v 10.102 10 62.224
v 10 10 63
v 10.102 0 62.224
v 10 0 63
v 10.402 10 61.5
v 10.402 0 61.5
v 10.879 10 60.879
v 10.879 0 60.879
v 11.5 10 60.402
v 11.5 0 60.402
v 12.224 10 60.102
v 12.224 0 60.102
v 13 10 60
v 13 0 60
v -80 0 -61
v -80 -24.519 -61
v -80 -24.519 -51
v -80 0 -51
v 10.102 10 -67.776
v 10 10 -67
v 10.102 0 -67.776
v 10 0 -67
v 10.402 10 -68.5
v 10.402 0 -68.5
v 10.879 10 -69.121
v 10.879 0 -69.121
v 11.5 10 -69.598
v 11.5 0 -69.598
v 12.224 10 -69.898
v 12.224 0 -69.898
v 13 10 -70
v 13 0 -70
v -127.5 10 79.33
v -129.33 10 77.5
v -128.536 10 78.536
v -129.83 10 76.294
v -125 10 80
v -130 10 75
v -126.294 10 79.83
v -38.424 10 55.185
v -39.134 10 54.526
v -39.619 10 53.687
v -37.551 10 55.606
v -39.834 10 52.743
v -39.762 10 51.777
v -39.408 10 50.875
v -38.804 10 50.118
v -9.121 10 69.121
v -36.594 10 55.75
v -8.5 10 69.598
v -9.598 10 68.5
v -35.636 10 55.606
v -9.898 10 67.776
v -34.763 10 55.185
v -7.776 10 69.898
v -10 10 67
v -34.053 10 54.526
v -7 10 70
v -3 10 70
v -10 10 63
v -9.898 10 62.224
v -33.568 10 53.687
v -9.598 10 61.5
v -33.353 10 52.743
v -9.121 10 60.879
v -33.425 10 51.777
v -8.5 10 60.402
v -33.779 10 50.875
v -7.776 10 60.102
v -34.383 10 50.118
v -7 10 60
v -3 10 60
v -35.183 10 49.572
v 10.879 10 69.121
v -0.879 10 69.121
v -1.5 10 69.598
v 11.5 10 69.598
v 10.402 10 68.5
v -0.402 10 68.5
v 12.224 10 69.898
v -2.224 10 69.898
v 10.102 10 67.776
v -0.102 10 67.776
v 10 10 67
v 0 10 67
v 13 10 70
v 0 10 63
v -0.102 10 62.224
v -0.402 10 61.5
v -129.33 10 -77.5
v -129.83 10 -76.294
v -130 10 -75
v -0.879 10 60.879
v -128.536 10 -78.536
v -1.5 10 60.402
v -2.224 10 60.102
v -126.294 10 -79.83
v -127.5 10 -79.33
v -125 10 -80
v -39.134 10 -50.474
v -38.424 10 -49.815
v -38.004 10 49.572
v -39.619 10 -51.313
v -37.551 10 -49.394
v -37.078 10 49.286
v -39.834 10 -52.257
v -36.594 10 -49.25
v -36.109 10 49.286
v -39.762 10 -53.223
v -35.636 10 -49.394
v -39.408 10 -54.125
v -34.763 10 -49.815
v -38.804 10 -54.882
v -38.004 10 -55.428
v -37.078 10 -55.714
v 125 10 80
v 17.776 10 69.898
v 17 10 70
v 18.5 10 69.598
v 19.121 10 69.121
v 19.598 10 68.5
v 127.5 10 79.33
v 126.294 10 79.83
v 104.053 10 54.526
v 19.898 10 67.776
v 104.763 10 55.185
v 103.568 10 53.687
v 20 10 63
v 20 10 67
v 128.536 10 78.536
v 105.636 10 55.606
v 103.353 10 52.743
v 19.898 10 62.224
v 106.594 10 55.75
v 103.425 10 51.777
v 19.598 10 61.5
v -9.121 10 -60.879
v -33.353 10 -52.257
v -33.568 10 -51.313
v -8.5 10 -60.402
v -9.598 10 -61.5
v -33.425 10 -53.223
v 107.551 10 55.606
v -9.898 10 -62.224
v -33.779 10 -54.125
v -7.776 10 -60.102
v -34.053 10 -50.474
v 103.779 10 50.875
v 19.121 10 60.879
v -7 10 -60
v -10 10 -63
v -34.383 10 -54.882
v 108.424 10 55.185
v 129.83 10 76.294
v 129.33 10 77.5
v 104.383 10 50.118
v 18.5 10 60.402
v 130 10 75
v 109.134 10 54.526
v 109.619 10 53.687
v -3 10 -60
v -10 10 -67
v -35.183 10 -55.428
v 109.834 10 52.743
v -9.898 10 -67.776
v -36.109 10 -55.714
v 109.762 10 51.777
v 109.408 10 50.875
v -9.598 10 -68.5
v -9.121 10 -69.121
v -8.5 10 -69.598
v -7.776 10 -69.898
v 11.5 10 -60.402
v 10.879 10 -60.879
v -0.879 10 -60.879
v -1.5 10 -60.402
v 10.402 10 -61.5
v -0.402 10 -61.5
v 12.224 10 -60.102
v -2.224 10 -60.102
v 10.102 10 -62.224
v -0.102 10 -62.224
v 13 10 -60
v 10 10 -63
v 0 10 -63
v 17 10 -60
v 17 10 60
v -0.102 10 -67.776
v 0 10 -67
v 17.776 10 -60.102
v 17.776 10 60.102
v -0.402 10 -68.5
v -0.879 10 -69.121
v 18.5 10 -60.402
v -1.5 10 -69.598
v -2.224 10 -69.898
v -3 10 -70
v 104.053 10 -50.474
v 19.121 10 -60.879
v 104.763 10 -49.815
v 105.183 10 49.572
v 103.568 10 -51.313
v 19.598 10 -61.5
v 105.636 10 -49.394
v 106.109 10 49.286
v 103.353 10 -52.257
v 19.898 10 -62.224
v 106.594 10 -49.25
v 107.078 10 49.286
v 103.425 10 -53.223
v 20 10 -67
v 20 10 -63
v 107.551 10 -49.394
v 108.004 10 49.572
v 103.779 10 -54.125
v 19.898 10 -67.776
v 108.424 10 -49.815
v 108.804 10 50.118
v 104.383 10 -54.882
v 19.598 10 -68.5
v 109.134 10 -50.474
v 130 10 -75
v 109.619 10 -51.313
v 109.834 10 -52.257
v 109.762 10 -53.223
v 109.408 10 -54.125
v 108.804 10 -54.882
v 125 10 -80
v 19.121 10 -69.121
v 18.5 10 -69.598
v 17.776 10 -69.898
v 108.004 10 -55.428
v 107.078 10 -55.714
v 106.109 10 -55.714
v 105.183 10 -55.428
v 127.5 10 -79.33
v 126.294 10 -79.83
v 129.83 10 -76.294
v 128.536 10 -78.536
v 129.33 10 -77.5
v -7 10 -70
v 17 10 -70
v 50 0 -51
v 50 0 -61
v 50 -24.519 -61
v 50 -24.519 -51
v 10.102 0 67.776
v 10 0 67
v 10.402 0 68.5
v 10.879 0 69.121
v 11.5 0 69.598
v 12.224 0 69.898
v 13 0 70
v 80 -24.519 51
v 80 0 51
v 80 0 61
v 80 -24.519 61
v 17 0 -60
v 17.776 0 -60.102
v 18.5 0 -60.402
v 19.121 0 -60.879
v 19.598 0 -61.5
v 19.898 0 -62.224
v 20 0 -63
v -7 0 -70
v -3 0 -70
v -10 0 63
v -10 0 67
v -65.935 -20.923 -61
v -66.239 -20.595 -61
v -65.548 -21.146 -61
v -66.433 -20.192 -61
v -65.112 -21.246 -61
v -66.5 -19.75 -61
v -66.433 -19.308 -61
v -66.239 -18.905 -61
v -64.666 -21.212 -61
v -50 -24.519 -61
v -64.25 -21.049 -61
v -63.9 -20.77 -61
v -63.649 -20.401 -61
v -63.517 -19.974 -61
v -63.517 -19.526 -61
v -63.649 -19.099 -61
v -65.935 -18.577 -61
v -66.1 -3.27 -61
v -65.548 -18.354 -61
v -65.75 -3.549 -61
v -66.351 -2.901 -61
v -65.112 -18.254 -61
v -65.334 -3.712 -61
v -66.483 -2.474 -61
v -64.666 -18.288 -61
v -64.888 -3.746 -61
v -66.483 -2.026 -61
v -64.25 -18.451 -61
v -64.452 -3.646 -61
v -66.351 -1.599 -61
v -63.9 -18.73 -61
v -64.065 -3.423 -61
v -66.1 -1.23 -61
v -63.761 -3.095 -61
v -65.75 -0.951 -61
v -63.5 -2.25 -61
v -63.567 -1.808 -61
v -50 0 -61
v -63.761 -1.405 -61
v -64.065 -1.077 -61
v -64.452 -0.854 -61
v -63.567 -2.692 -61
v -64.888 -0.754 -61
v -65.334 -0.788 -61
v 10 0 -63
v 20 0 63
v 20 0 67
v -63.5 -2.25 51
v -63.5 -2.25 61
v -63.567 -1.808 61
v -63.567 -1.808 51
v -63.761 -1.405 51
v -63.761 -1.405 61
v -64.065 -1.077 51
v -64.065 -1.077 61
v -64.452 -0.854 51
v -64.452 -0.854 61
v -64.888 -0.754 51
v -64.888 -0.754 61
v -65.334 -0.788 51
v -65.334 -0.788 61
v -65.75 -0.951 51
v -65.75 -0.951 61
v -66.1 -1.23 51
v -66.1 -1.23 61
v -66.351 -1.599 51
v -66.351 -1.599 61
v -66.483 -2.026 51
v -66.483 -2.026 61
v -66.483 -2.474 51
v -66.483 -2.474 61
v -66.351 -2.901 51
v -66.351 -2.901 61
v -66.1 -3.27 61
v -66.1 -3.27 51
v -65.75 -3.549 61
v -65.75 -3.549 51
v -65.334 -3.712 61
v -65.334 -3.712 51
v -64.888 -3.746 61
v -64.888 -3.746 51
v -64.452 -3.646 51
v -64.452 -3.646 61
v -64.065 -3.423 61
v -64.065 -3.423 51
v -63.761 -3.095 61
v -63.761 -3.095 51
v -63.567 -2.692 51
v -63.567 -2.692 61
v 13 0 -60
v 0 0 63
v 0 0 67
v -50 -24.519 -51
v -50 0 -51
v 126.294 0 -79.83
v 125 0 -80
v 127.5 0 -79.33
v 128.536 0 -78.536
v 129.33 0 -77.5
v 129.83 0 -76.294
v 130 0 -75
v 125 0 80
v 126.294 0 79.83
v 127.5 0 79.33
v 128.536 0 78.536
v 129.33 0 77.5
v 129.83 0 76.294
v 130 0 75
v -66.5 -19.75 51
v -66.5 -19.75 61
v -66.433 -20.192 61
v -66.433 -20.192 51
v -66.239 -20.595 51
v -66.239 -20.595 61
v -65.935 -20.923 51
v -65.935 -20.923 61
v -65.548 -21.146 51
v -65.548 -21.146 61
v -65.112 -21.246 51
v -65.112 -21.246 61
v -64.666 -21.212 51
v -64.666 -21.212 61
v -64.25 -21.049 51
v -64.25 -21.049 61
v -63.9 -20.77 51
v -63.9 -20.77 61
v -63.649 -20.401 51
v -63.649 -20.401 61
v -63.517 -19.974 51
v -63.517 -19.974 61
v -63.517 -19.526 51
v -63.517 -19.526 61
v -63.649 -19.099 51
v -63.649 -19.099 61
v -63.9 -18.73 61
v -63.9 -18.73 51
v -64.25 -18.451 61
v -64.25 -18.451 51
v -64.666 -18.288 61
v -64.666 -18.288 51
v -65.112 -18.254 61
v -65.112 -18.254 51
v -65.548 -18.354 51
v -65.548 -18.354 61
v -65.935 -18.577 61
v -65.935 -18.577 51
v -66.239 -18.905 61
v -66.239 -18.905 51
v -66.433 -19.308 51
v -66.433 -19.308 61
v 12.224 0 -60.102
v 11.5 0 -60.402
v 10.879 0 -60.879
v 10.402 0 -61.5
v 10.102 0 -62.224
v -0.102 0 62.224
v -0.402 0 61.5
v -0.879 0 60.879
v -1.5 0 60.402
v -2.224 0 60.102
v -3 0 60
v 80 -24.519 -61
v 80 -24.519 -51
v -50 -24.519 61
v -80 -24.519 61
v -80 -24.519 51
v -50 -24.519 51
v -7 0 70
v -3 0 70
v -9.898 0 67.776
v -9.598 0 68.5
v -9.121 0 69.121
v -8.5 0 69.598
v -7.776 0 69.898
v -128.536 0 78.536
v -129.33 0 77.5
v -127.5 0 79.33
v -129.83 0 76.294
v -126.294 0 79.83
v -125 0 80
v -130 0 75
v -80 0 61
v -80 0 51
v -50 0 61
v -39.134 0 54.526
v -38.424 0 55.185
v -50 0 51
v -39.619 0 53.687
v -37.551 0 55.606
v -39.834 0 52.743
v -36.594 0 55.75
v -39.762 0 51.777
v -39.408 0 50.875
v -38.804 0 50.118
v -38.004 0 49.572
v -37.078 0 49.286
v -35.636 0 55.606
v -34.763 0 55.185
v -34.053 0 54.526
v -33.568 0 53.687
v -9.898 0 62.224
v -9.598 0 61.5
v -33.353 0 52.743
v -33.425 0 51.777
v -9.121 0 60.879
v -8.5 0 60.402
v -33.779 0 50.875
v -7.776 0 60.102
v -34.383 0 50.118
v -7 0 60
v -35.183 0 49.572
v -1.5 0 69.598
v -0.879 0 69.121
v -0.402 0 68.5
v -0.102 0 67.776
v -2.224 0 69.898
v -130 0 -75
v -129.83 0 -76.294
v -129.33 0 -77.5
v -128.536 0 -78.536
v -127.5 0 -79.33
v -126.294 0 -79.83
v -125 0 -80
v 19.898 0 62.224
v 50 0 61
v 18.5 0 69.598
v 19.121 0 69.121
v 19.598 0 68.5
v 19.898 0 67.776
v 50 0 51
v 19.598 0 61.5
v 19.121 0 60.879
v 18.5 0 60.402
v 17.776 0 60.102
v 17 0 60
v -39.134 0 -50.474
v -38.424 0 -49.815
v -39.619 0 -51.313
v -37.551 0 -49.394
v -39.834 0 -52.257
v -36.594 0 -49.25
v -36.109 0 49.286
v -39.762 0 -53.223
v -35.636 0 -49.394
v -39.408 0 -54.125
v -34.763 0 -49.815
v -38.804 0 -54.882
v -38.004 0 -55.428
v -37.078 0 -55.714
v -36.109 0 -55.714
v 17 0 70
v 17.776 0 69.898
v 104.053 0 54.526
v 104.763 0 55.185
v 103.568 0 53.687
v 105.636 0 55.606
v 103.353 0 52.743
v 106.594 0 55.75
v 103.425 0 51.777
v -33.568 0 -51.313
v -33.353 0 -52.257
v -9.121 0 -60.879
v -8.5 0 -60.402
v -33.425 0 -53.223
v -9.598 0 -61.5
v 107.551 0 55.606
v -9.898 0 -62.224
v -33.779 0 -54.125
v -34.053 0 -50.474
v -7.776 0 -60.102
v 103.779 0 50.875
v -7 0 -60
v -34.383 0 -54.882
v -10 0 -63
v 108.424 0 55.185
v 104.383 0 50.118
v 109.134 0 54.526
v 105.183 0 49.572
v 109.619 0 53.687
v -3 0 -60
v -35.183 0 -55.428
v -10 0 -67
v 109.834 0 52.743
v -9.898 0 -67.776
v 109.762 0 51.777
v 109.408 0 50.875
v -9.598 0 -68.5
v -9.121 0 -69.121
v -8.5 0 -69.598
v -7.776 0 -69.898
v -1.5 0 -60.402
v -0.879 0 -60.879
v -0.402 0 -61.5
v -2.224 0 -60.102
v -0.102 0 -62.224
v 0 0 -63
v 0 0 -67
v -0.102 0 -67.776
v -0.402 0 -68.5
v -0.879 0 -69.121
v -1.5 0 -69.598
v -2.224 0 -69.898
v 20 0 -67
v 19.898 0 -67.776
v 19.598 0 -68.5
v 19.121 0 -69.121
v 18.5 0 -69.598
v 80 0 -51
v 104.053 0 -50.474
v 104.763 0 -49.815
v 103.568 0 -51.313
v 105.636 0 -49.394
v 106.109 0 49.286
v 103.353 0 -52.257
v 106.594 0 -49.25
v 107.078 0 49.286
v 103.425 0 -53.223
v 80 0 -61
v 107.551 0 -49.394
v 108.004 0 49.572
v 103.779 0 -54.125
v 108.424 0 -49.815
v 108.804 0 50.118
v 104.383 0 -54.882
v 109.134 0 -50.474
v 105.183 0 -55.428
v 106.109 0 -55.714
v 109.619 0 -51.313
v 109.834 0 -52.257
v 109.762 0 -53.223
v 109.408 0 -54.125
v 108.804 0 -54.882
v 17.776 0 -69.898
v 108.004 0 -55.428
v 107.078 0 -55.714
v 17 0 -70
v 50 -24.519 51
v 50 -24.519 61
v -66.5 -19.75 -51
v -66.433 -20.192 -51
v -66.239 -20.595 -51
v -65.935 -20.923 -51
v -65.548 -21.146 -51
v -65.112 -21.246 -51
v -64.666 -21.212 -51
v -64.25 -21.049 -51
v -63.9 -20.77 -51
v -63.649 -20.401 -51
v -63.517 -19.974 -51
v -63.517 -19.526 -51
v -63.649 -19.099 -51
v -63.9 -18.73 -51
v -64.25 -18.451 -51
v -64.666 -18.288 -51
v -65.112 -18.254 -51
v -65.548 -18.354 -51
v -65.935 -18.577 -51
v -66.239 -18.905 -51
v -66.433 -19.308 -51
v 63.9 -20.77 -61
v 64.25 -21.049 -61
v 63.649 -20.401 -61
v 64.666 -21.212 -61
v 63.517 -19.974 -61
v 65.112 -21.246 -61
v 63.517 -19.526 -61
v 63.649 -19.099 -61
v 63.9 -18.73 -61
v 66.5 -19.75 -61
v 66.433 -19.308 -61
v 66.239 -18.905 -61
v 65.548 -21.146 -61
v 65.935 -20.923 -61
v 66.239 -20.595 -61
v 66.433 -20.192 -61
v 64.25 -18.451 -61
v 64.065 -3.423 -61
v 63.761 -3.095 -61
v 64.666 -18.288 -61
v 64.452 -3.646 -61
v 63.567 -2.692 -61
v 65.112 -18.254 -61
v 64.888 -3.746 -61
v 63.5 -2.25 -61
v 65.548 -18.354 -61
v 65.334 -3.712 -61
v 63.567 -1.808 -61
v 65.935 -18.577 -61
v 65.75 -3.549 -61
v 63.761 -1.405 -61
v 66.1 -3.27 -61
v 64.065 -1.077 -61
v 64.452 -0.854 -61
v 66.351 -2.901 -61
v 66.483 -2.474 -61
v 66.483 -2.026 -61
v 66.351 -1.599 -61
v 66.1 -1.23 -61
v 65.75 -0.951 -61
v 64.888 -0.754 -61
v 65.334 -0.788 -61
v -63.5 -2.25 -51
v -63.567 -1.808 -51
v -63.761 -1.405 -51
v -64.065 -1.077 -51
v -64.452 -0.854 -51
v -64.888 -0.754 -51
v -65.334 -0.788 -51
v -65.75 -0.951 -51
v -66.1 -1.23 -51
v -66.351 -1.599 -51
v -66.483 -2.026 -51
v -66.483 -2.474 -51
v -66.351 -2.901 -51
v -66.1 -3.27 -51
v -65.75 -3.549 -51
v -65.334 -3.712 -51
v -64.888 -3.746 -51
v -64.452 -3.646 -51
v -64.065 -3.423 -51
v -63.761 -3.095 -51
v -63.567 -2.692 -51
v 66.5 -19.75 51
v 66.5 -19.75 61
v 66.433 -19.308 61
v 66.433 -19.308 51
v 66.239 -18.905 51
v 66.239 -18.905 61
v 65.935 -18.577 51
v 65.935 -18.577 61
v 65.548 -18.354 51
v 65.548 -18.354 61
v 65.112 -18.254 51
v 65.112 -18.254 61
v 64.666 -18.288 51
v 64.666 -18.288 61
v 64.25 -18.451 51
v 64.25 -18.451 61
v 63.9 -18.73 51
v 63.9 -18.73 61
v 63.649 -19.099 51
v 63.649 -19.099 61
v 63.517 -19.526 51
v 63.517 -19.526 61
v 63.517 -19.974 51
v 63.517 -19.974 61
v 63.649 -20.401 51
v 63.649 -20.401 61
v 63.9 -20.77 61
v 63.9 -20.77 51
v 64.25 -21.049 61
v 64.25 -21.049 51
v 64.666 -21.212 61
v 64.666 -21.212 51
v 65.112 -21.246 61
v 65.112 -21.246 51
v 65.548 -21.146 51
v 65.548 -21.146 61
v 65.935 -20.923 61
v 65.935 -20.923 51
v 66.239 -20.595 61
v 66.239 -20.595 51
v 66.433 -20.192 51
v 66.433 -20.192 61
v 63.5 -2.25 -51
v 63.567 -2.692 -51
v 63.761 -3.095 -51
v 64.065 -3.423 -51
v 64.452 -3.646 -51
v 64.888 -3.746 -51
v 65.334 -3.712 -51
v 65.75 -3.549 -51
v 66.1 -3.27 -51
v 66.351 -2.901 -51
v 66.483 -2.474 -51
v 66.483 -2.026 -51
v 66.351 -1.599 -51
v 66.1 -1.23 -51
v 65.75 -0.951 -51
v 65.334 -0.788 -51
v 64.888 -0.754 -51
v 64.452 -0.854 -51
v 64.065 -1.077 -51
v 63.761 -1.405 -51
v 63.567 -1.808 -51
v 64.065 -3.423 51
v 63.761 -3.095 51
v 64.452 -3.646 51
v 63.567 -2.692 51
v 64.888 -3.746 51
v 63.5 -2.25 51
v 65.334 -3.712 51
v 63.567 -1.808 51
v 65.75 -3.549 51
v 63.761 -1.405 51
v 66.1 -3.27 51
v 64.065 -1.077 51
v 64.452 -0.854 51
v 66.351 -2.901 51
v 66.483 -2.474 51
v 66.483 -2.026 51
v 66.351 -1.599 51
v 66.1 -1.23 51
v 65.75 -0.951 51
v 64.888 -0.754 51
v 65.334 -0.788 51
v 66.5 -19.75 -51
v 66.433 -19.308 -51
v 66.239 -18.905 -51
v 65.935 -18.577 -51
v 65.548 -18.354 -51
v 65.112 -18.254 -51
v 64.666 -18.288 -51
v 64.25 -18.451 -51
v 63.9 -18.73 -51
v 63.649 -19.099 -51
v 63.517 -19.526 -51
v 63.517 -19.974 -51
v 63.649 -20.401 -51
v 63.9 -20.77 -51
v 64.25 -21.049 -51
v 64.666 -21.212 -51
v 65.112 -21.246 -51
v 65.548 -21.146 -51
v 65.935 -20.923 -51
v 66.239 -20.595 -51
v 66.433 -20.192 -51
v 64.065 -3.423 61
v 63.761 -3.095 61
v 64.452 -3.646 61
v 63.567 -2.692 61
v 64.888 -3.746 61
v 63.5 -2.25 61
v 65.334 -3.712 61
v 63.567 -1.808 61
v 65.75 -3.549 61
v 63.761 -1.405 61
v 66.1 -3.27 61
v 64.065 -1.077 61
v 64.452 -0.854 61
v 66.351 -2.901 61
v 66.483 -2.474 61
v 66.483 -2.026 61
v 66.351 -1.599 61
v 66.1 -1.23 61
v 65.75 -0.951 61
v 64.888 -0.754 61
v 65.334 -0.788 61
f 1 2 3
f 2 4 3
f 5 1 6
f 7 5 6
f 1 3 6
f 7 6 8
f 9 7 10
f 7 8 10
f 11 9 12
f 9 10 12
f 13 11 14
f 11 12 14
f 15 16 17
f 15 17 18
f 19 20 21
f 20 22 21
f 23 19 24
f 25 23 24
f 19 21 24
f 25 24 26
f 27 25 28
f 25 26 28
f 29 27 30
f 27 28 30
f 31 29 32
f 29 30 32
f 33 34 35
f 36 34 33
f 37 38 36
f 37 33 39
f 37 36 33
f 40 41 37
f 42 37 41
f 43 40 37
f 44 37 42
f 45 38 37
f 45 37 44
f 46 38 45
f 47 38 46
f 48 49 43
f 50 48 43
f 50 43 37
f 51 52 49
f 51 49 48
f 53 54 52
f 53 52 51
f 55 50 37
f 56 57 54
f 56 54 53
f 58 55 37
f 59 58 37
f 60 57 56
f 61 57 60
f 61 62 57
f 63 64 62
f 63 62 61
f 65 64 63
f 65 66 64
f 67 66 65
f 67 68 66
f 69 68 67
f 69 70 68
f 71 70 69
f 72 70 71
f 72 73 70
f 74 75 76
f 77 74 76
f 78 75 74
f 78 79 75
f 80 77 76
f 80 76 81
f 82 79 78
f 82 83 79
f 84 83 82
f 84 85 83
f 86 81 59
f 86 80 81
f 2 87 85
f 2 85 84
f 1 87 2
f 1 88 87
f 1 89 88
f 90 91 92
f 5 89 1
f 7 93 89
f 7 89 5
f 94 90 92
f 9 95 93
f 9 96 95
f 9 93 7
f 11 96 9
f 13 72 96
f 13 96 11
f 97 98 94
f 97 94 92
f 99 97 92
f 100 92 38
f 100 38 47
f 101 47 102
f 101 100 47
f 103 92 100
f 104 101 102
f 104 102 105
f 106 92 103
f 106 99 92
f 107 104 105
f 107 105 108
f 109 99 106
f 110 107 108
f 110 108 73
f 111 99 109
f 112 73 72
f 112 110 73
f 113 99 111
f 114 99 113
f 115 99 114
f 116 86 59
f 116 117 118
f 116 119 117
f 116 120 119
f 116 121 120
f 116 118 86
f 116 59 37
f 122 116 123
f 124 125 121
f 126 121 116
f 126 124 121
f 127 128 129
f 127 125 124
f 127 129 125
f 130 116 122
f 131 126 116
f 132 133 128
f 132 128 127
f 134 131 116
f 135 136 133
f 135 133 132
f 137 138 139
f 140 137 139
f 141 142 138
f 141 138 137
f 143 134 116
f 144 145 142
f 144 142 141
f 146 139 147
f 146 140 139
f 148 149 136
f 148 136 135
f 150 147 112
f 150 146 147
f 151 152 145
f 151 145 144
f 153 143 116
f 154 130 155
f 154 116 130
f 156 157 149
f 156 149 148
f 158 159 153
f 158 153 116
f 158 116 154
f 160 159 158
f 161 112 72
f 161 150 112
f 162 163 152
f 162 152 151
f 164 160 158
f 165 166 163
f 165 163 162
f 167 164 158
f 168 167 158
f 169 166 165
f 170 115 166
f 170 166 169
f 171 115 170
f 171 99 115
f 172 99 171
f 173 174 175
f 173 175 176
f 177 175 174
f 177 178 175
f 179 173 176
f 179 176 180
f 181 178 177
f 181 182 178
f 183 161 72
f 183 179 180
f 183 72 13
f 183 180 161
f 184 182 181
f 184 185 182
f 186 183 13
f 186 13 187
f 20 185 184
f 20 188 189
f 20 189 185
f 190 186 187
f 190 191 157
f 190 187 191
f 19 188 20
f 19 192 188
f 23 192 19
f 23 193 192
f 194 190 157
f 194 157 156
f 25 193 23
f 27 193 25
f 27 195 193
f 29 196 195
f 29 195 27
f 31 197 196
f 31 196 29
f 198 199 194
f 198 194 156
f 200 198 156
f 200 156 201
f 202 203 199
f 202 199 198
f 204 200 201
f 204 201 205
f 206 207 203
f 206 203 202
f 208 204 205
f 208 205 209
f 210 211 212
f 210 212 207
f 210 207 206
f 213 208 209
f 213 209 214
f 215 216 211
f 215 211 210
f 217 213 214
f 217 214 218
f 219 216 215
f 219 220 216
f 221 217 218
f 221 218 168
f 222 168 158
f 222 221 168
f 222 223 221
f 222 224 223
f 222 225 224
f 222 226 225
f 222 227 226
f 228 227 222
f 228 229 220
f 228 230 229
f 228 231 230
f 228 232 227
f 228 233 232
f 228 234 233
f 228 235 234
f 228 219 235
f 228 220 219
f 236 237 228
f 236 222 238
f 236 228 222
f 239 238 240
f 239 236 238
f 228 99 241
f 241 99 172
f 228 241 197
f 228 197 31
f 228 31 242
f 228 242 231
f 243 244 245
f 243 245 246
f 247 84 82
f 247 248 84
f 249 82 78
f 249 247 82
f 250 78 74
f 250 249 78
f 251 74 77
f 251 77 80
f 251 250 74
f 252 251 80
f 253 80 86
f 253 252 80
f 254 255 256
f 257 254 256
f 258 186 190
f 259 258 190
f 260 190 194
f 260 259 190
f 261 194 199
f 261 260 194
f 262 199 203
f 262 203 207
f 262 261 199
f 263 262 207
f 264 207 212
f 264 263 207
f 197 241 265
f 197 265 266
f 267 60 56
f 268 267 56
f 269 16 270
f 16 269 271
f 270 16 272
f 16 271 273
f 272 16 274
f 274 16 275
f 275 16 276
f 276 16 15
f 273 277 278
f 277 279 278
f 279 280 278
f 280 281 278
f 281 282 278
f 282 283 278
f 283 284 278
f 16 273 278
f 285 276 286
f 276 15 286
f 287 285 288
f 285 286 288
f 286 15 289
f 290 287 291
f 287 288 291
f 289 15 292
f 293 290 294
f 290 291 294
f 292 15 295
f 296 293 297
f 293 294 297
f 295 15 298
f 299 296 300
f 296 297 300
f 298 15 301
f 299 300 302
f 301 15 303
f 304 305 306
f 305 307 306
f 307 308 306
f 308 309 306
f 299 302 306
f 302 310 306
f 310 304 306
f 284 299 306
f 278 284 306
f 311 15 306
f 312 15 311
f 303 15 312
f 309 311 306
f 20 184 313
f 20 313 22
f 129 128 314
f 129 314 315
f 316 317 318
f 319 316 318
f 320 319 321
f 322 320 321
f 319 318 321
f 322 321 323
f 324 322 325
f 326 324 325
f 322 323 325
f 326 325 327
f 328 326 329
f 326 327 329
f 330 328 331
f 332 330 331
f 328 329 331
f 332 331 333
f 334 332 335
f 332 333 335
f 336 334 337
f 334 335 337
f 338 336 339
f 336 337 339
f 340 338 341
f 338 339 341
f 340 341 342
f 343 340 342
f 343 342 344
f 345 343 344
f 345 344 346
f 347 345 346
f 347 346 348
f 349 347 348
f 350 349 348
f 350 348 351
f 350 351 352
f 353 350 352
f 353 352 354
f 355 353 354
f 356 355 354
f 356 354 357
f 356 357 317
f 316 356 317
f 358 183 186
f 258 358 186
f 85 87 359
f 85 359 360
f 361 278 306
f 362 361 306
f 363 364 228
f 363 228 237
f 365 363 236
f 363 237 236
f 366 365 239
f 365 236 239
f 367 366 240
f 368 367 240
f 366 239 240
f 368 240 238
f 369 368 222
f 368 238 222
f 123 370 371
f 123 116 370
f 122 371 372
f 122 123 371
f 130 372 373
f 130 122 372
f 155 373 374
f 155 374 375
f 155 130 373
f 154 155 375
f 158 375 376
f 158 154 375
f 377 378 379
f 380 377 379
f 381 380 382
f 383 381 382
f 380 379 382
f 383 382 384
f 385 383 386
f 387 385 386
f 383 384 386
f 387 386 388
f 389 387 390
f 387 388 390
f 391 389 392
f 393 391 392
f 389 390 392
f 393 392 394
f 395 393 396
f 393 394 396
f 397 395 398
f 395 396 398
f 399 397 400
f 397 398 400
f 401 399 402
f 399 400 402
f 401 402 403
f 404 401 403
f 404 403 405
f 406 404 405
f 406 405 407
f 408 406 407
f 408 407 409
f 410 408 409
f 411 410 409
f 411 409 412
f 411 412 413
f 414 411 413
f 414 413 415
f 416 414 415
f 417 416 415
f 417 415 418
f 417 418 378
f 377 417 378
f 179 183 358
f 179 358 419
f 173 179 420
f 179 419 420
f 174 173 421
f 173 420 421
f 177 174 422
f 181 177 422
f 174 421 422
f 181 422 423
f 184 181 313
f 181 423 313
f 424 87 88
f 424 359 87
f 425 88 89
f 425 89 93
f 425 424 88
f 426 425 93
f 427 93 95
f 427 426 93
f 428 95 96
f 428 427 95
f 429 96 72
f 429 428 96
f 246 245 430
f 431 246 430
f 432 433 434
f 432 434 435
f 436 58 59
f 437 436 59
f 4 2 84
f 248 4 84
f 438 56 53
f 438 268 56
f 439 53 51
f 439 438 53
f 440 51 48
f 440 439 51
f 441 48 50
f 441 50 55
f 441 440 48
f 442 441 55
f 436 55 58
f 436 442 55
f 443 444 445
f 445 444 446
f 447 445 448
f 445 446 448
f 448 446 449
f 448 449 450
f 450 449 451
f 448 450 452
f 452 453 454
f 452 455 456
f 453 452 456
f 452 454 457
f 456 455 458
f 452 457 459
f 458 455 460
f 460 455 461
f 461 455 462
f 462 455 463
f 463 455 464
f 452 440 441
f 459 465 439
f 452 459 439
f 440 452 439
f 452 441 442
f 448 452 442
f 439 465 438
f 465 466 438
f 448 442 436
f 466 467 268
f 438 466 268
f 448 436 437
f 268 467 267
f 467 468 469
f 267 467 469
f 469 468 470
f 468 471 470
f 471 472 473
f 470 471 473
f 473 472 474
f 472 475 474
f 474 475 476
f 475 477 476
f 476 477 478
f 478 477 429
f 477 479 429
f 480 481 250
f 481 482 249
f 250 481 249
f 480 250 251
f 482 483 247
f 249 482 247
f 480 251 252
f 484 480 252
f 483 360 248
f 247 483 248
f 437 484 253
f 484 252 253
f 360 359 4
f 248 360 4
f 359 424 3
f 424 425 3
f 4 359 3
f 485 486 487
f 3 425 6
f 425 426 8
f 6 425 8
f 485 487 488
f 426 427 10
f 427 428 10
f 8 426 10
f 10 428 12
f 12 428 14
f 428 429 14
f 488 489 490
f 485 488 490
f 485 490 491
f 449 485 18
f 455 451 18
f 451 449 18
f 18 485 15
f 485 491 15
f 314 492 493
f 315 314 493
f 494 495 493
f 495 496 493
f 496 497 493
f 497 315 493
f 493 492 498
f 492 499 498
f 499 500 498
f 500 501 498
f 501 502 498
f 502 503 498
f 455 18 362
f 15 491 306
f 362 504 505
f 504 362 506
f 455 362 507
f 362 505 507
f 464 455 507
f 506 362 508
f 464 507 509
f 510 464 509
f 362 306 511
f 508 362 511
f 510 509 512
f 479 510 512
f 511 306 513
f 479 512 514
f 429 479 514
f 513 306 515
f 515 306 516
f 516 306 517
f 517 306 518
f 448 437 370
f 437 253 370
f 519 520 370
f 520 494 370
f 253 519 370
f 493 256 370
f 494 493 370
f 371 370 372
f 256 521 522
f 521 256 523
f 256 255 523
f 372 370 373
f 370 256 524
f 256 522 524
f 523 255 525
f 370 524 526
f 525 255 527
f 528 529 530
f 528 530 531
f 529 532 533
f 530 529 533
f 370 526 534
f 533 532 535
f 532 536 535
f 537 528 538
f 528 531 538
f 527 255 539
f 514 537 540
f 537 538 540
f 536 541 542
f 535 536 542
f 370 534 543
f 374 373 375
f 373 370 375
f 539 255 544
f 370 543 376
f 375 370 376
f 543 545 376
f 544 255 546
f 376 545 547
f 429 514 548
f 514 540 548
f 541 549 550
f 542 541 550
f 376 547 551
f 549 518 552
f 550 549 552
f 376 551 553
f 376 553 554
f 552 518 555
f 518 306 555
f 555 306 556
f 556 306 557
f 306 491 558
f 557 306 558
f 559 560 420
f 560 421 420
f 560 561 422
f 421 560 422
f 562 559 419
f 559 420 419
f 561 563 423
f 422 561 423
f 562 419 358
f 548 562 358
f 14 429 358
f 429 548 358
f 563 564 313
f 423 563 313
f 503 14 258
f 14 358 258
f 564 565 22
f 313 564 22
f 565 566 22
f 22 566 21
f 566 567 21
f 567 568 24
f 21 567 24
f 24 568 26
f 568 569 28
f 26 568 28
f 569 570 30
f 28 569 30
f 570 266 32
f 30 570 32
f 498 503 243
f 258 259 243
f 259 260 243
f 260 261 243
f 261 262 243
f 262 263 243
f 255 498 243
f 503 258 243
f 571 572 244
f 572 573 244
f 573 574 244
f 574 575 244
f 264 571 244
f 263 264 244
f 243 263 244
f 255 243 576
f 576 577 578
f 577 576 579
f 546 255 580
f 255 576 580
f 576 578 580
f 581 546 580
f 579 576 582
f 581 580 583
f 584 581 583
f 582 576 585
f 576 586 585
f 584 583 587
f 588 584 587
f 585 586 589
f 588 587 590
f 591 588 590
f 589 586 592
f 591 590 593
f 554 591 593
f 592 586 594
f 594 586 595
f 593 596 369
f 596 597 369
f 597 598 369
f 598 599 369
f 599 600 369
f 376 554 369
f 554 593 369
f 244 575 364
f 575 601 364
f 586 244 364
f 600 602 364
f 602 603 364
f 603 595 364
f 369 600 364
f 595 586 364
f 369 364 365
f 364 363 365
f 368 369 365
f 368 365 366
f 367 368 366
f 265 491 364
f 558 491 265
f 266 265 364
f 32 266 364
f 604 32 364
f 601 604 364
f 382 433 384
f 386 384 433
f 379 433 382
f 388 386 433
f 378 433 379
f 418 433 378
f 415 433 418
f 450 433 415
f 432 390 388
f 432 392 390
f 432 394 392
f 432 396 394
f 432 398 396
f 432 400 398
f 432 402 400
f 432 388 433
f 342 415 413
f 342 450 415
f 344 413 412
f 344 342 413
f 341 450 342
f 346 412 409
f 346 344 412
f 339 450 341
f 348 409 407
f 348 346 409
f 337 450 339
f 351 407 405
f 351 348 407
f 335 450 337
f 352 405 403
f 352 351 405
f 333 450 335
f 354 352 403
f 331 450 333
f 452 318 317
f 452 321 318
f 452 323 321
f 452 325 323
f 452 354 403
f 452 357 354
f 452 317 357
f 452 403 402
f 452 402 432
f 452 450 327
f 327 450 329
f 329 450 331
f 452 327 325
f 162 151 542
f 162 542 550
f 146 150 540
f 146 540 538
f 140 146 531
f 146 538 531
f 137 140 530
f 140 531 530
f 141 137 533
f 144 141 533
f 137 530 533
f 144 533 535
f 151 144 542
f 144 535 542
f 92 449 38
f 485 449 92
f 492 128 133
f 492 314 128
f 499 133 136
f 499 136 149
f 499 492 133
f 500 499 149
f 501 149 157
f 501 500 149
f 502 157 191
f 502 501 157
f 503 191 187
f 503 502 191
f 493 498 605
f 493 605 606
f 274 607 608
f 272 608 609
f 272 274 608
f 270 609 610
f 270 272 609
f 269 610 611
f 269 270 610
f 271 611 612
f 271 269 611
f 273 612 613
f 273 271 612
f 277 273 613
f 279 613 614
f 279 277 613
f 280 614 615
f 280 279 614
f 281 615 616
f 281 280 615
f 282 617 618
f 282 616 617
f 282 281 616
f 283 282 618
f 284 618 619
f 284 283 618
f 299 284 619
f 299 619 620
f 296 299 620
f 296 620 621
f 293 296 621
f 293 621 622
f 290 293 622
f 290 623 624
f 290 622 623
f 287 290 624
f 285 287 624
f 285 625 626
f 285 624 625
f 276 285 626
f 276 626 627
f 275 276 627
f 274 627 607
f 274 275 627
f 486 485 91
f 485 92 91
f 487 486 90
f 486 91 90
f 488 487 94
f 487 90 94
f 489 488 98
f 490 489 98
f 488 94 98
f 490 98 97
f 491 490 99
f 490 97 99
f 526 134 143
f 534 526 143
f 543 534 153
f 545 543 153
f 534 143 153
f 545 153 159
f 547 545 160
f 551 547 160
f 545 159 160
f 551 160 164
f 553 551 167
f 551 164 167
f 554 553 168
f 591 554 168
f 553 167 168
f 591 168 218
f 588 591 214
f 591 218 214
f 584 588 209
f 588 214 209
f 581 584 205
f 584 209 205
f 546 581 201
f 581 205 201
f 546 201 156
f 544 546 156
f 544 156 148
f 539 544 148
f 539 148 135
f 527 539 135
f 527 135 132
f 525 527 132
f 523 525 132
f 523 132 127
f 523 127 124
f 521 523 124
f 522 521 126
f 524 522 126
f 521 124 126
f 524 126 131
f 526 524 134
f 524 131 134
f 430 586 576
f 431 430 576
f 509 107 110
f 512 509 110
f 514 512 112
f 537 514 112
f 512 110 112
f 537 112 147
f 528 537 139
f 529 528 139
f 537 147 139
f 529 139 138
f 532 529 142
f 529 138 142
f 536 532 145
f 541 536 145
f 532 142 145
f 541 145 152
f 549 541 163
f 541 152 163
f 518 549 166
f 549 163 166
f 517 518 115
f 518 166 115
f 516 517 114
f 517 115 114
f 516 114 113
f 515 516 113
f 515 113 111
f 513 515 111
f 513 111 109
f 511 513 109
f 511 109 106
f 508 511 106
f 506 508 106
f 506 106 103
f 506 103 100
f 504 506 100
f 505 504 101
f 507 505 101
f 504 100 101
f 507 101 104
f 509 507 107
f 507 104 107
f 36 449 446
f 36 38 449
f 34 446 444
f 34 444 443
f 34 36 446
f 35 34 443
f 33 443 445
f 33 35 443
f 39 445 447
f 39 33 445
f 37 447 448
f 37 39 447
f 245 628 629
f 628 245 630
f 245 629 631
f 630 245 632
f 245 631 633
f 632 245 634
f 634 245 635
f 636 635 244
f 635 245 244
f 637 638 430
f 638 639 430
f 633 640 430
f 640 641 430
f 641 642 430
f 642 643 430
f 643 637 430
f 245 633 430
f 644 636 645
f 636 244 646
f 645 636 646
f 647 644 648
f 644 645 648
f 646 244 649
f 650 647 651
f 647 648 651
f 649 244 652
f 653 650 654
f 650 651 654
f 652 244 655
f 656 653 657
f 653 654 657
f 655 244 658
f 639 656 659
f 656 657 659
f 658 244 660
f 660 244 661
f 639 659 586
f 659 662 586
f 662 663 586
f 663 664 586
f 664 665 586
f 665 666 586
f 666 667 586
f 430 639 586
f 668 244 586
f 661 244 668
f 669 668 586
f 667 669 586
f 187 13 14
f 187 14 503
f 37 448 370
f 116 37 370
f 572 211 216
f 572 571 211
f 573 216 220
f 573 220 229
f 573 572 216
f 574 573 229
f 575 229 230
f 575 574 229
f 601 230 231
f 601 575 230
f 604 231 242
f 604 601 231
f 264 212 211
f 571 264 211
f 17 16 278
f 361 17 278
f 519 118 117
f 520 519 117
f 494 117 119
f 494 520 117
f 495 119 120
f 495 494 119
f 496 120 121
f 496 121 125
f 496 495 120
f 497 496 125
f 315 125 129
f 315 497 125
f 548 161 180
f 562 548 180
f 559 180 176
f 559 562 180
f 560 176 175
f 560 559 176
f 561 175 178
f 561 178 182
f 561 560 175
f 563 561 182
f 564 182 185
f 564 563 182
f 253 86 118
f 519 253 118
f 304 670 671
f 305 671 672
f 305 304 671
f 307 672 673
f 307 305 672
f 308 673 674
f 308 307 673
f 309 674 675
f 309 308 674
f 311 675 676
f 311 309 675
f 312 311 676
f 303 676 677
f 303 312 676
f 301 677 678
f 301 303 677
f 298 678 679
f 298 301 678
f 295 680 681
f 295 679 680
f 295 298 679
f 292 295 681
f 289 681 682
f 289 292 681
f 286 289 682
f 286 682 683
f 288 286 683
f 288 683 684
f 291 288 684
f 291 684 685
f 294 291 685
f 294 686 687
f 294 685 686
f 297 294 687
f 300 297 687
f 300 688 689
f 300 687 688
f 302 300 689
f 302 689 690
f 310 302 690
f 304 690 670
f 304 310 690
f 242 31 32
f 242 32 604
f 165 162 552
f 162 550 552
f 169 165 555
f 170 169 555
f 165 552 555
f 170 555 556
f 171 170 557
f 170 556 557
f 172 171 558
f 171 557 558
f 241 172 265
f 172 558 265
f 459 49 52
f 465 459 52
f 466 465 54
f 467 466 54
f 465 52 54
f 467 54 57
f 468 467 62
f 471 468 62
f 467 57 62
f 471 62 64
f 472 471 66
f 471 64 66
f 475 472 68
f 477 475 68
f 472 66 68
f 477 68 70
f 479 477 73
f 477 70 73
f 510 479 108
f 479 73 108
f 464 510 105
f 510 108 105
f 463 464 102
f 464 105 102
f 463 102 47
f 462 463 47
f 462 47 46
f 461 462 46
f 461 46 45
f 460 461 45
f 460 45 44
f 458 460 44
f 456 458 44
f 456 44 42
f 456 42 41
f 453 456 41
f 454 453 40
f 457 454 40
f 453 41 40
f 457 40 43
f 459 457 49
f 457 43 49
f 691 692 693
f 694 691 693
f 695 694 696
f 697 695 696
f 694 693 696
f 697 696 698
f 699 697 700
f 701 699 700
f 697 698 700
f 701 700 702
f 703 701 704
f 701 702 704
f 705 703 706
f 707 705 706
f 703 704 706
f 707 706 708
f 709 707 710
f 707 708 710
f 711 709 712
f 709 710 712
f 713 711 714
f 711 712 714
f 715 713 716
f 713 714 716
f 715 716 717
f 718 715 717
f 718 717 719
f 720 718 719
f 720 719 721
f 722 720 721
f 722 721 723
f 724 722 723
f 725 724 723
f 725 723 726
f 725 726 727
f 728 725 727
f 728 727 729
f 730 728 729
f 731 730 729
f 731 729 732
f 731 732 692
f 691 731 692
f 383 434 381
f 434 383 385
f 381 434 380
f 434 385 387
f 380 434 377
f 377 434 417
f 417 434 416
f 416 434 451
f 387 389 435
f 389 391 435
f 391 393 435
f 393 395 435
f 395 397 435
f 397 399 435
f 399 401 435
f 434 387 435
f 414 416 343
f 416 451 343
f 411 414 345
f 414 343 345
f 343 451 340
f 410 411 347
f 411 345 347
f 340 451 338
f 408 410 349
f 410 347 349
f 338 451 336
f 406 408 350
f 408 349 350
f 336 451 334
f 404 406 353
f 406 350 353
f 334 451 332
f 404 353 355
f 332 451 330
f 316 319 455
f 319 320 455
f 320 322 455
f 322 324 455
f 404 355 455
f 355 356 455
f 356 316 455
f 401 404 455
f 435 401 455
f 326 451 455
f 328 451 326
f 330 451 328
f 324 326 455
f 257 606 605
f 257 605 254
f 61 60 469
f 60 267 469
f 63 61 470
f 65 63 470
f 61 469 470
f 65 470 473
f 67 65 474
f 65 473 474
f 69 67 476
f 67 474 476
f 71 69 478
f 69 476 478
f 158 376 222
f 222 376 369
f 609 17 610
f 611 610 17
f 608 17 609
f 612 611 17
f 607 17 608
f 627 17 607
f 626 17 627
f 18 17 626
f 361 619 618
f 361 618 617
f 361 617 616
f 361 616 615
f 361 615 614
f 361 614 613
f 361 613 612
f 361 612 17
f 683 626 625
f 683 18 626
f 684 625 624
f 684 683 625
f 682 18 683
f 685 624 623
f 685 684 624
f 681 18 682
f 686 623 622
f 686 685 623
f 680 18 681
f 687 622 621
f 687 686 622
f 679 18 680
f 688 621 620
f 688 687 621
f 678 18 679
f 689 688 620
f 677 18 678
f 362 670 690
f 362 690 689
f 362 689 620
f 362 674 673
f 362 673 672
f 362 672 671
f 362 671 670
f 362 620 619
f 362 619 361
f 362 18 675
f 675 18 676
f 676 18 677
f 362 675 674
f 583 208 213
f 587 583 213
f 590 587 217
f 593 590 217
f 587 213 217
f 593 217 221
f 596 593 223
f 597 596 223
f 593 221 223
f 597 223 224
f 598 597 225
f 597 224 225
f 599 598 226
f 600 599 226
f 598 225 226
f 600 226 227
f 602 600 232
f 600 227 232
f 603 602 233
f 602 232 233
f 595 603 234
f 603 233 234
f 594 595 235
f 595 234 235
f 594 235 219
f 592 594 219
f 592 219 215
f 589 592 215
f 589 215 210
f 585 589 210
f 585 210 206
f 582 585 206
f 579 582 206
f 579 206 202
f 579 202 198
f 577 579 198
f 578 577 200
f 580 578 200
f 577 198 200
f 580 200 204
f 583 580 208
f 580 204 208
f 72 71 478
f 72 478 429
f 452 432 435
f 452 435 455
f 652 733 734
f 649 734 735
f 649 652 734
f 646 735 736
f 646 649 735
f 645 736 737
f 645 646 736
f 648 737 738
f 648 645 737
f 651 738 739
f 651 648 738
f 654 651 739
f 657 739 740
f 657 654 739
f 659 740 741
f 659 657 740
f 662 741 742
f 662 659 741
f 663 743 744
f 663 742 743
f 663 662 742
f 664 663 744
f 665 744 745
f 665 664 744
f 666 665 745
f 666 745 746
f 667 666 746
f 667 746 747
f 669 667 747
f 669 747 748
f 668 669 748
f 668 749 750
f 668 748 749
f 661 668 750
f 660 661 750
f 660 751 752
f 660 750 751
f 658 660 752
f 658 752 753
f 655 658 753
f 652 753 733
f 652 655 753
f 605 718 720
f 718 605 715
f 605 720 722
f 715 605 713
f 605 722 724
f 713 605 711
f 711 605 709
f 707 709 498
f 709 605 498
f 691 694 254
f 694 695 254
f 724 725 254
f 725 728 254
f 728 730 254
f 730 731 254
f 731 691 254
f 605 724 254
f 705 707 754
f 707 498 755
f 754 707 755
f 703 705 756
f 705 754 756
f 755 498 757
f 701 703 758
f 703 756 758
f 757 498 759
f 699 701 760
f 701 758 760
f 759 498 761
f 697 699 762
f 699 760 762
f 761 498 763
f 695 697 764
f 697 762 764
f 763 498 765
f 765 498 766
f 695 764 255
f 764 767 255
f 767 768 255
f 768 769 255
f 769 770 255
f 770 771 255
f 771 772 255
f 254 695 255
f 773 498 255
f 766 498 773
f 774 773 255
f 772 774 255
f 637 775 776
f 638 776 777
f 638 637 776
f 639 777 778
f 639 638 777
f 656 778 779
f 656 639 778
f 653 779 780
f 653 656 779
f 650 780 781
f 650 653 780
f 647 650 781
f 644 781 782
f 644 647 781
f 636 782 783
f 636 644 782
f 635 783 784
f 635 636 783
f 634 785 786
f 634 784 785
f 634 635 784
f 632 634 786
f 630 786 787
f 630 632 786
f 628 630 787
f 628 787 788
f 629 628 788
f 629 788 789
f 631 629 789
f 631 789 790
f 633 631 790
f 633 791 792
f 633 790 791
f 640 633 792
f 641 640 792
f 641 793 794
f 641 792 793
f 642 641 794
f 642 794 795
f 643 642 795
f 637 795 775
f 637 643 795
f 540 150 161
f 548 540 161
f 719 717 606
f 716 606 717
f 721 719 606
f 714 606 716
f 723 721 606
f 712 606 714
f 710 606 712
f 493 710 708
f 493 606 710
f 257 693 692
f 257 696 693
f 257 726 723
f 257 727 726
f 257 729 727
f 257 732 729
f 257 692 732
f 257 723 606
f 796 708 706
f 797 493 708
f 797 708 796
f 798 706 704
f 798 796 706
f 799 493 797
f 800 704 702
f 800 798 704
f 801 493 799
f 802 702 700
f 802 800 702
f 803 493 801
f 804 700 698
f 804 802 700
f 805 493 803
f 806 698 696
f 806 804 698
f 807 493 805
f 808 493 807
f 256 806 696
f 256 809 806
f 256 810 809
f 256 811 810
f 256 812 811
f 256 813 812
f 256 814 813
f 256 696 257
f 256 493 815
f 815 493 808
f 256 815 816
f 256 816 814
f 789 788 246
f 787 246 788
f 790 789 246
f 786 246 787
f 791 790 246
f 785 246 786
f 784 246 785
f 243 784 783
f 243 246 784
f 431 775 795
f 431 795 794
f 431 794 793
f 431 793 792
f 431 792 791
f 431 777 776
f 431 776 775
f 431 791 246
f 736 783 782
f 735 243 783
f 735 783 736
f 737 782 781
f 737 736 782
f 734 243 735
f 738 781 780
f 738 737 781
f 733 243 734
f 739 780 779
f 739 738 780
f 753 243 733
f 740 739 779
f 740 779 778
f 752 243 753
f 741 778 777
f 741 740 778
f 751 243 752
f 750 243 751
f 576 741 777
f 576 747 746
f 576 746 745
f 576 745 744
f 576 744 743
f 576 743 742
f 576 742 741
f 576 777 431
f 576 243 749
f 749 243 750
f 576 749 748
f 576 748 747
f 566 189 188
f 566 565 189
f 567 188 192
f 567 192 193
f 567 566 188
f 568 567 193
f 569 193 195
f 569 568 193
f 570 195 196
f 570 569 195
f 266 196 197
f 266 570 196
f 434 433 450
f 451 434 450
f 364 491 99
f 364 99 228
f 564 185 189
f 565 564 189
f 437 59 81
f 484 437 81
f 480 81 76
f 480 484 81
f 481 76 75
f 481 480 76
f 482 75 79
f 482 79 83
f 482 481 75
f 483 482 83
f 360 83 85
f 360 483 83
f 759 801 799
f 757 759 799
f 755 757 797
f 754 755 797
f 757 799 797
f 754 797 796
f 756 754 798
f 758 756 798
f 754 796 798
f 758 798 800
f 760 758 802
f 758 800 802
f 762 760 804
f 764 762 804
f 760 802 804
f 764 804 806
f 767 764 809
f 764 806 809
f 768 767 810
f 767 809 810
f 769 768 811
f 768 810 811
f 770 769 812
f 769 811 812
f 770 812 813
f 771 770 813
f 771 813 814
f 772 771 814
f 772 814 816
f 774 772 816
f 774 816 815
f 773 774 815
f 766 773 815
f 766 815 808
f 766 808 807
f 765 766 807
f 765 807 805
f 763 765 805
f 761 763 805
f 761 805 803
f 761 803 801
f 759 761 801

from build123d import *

# Parameters (mm, degrees)
SKETCH1_W           = 260
SKETCH1_H           = 160
BOSS_EXTRUDE1_DEPTH = 10
SKETCH2_W           = 30
SKETCH2_H           = 10
BOSS_EXTRUDE2_DEPTH = 22
SKETCH3_R           = 1.5
CUT_EXTRUDE1_DEPTH  = 112
SKETCH4_W           = 30
SKETCH4_H           = 2.519449054
BOSS_EXTRUDE3_DEPTH = 10
SKETCH5_R           = 3.25
CUT_EXTRUDE4_DEPTH  = 10
SKETCH7_W           = 10
SKETCH7_H           = 10
CUT_EXTRUDE5_DEPTH  = 10
FILLET1_R           = 5
FILLET2_R           = 3


with BuildPart() as part:
    # Sketch1 → Boss-Extrude1 (new body)
    with BuildSketch(Plane(origin=(0, 0, 0), x_dir=(1, 0, 0), z_dir=(0, 1, 0))):
        Rectangle(SKETCH1_W, SKETCH1_H)
    extrude(amount=BOSS_EXTRUDE1_DEPTH)

    # Sketch2 → Boss-Extrude2 (add)
    with BuildSketch(Plane.XZ):
        with Locations((-65, 56)):
            Rectangle(SKETCH2_W, SKETCH2_H)
        with Locations((65, 56)):
            Rectangle(SKETCH2_W, SKETCH2_H)
        with Locations((65, -56)):
            Rectangle(SKETCH2_W, SKETCH2_H)
        with Locations((-65, -56)):
            Rectangle(SKETCH2_W, SKETCH2_H)
    extrude(amount=BOSS_EXTRUDE2_DEPTH)

    # Sketch3 → Cut-Extrude1 (cut)
    with BuildSketch(Plane.XY.offset(61)):
        with Locations((-65, -2.25)):
            Circle(SKETCH3_R)
        with Locations(Location((-65, -19.75, 0), (0, 0, 180))):
            Circle(SKETCH3_R)
        with Locations((65, -19.75)):
            Circle(SKETCH3_R)
        with Locations(Location((65, -2.25, 0), (0, 0, 180))):
            Circle(SKETCH3_R)
    cut_extrude1 = extrude(amount=-CUT_EXTRUDE1_DEPTH, mode=Mode.SUBTRACT)

    # Mirror1: Cut-Extrude1 across plane
    add(cut_extrude1.mirror(Plane.XY), mode=Mode.SUBTRACT)

    # Sketch4 → Boss-Extrude3 (add)
    with BuildSketch(Plane.XY.offset(61)):
        with Locations((-65, -23.259724527)):
            Rectangle(SKETCH4_W, SKETCH4_H)
        with Locations((65, -23.259724527)):
            Rectangle(SKETCH4_W, SKETCH4_H)
    boss_extrude3 = extrude(amount=-BOSS_EXTRUDE3_DEPTH)

    # Mirror3: Boss-Extrude3 across plane
    add(boss_extrude3.mirror(Plane.XY))

    # Sketch5 → Cut-Extrude4 (cut)
    with BuildSketch(Plane(origin=(0, 10, 0), x_dir=(1, 0, 0), z_dir=(0, 1, 0))):
        with Locations(Location((-36.593545043, 52.5, 0), (0, 0, 270))):
            Circle(SKETCH5_R)
        with Locations(Location((106.593545043, 52.5, 0), (0, 0, 270))):
            Circle(SKETCH5_R)
        with Locations(Location((-36.593545043, -52.5, 0), (0, 0, 270))):
            Circle(SKETCH5_R)
        with Locations(Location((106.593545043, -52.5, 0), (0, 0, 270))):
            Circle(SKETCH5_R)
    extrude(amount=-CUT_EXTRUDE4_DEPTH, mode=Mode.SUBTRACT)

    # Sketch7 → Cut-Extrude5 (cut)
    with BuildSketch(Plane(origin=(0, 10, 0), x_dir=(1, 0, 0), z_dir=(0, 1, 0))):
        with Locations((-5, 65)):
            Rectangle(SKETCH7_W, SKETCH7_H)
        with Locations((15, 65)):
            Rectangle(SKETCH7_W, SKETCH7_H)
    cut_extrude5 = extrude(amount=-CUT_EXTRUDE5_DEPTH, mode=Mode.SUBTRACT)

    # Mirror4: Cut-Extrude5 across plane
    add(cut_extrude5.mirror(Plane(origin=(0, 0, 0), x_dir=(1, 0, 0), z_dir=(0, 0, -1))), mode=Mode.SUBTRACT)

    # Fillet1
    fillet1_edges = [part.edges().sort_by_distance(p)[0] for p in [
        (130, 5, 80),
        (-130, 5, 80),
        (-130, 5, -80),
        (130, 5, -80),
    ]]
    fillet(fillet1_edges, radius=FILLET1_R)

    # Fillet2
    fillet2_edges = [part.edges().sort_by_distance(p)[0] for p in [
        (-10, 5, -60),
        (-10, 5, -70),
        (0, 5, -70),
        (0, 5, -60),
        (20, 5, -60),
        (10, 5, -60),
        (10, 5, -70),
        (20, 5, -70),
        (0, 5, 70),
        (0, 5, 60),
        (-10, 5, 60),
        (-10, 5, 70),
        (10, 5, 70),
        (20, 5, 70),
        (20, 5, 60),
        (10, 5, 60),
    ]]
    fillet(fillet2_edges, radius=FILLET2_R)


solid = part.part
